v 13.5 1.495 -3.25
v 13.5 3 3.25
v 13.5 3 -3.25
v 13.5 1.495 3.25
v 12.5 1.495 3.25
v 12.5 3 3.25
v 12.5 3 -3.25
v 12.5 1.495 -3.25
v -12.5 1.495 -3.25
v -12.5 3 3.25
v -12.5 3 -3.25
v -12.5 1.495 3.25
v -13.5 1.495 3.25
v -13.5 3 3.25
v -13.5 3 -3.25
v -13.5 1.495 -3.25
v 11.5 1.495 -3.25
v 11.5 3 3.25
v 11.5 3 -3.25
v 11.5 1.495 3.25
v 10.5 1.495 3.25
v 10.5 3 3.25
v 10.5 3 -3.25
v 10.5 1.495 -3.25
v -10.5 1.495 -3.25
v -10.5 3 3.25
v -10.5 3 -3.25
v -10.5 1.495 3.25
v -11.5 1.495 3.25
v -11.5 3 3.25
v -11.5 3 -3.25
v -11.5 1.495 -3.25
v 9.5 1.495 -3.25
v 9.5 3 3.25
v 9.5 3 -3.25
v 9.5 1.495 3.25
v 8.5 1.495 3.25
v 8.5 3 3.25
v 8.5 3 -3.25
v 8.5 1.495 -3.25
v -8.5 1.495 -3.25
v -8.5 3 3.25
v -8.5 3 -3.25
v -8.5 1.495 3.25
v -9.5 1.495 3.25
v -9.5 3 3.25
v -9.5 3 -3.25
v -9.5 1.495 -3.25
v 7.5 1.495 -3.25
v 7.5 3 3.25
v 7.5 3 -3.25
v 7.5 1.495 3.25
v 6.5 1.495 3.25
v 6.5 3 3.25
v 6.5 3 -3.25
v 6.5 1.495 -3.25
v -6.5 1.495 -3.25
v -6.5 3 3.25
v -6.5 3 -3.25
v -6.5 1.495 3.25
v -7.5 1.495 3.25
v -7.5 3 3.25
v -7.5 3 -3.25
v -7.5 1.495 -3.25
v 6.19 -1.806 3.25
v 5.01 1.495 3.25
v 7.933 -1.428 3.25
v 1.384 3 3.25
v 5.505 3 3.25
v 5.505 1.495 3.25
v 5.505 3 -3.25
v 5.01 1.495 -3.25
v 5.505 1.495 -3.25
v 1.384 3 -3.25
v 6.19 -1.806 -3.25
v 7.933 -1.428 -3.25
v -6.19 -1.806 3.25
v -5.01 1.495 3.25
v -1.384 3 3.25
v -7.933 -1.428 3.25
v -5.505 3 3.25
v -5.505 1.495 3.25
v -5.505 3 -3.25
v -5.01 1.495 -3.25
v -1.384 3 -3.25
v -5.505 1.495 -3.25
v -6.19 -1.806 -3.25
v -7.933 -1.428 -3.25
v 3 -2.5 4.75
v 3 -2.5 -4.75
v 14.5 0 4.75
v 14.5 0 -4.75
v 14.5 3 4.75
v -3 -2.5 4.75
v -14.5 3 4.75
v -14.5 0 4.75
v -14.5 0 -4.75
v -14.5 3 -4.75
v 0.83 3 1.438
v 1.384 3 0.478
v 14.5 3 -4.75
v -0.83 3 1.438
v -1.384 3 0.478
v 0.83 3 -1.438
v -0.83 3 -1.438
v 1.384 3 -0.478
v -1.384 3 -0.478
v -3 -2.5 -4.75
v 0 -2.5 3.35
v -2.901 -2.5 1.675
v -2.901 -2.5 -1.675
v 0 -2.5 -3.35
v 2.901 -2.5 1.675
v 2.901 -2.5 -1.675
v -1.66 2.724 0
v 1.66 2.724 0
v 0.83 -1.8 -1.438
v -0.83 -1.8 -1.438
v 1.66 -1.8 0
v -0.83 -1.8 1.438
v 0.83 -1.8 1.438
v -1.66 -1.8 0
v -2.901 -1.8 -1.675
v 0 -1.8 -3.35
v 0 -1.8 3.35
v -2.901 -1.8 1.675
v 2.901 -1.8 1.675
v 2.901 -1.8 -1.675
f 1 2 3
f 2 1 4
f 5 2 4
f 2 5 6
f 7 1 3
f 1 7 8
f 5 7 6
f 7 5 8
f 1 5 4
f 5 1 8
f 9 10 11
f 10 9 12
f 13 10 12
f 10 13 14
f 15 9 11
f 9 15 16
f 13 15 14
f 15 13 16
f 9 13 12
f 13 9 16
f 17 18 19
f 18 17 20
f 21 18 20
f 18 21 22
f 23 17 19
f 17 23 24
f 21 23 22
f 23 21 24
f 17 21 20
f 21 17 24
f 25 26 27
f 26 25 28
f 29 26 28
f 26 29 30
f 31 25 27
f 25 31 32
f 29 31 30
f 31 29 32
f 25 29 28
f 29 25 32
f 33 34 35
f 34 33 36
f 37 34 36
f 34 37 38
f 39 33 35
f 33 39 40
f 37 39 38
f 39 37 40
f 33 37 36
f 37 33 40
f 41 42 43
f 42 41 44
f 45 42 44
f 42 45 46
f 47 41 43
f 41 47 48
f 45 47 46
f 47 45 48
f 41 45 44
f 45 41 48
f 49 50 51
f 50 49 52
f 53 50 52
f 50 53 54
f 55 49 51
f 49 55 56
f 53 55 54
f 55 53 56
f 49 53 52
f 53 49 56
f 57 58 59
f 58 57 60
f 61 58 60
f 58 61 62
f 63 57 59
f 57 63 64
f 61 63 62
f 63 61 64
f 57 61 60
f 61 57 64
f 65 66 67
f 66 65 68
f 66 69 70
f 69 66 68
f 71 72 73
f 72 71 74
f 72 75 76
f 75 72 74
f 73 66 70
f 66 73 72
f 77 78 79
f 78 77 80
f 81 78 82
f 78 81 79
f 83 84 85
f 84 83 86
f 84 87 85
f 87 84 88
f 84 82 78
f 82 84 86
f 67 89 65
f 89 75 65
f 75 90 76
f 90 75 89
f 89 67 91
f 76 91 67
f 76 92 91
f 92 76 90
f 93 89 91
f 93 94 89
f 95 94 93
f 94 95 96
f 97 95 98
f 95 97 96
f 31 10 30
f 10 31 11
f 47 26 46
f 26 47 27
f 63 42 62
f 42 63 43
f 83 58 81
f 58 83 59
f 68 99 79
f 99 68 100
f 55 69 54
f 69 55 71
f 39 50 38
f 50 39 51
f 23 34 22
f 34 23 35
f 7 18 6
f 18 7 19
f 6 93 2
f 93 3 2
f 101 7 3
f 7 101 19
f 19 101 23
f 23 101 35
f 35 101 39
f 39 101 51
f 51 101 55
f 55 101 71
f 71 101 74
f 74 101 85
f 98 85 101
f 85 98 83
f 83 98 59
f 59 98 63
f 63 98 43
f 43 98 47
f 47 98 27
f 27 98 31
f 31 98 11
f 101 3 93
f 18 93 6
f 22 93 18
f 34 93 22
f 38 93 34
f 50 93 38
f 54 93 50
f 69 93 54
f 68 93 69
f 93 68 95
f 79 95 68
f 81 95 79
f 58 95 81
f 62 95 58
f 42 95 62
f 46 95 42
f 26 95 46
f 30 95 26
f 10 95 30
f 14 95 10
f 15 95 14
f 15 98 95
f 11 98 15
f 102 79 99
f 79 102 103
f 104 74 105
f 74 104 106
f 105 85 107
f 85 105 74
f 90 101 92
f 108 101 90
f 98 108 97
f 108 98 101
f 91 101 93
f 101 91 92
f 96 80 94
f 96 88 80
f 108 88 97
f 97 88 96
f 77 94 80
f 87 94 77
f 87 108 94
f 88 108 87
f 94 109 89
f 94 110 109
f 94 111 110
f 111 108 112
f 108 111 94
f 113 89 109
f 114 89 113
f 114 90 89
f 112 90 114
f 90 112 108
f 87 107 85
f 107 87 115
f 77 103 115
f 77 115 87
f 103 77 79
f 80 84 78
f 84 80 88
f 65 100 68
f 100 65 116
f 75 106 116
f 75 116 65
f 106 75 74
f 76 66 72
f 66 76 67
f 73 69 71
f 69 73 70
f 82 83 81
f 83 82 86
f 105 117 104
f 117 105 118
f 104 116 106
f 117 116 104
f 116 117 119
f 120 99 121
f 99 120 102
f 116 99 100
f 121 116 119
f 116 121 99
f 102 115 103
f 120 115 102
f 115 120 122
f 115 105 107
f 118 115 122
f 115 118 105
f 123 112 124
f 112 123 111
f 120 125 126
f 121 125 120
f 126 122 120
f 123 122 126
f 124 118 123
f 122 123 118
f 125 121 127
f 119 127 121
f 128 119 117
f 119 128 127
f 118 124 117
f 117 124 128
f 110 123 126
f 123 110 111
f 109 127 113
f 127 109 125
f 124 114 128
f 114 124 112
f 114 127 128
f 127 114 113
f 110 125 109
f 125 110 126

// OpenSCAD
// Tough Belt Clip
// Design by Marius Gheorghescu, December 2013


// how many teeth on each side
teeth = 5;

// width of the belt in mm incl clearance (use 6.25 for typical GT2 belt)
belt_width = 6.5;

// thickness of the belt in mm (use 1.5 for GT2 belt)
belt_thickness = 1.5;

// belt pitch in mm (use 2.0 for GT2 belt)
pitch = 2.0;

// this controls the strength of the bracket 
shell = 1.5;

/* [Hidden] */
cutout_width = 6 + belt_thickness + shell;
len = 2*teeth*pitch + cutout_width;
round_corner_epsilon = 1;
epsilon = 0.01;


module belt()
{
	// reinforcement
	//cube([len, 2, h], center=true);

	for(i=[pitch/4:pitch:len]) {
		translate([i-len/2, 1.25, 0])
			cube([pitch - round_corner_epsilon, belt_thickness + round_corner_epsilon, belt_width], center=true);

	}

}



module clip() {
difference()  {

	union() {
		// general shape of the clip
		linear_extrude(belt_width + 2*shell, center=true) {
			polygon(points=[
				[len/2,0],
				[3,-2.5], 
				[-3,-2.5], 
				[-len/2,0], 
				[-len/2, shell + belt_thickness], 
				[len/2, shell + belt_thickness]
			]);
		}


		
	}

	// left belt turn
	rotate([0,0,-45])
	translate([-3.2/2 - shell - belt_thickness/2,0,0])
		cube([belt_thickness, 20 + 2*shell, belt_width], center=true);

	// right belt turn
	rotate([0,0,45])
//+ belt_thicknes/2 + shell
	translate([3.2/2 + shell + belt_thickness/2,0,0])
		cube([belt_thickness, 20 + 2*shell, belt_width], center=true);

	// cutouts
	translate([len/2 - teeth*pitch, shell + belt_thickness/2, 0])
		cube([pitch + epsilon, belt_thickness + epsilon, belt_width], center=true);

	translate([-len/2 + teeth*pitch, shell + belt_thickness/2, 0])
		cube([pitch + epsilon, belt_thickness + epsilon, belt_width], center=true);


	// m3 hole
	rotate([90,0,0])
		cylinder(r=1.66, h=10 + 2*shell, center=true);

	// hex nut
	translate([0, -3.8, 0])
	rotate([90,90,0])
		cylinder(r=3.35, h=4, center=true, $fn=6);

	// belt teeth
	for(i=[1:1:teeth]) {

		// left side
		color([1,0, 0])
		translate([len/2 + pitch/4 - i*pitch, shell + belt_thickness/2, 0])
			cube([pitch/2, belt_thickness + epsilon, belt_width], center=true);

		// right side 
		color([1,0, 0])
		translate([-len/2 - pitch/4 + i*pitch, shell + belt_thickness/2, 0])
			cube([pitch/2, belt_thickness + epsilon, belt_width], center=true);
	}

}


}


module clip_set()
{
	for(i=[0:10:50]) {
		translate([0,i,0])
			clip();
	}
}

//clip_set();
clip();

